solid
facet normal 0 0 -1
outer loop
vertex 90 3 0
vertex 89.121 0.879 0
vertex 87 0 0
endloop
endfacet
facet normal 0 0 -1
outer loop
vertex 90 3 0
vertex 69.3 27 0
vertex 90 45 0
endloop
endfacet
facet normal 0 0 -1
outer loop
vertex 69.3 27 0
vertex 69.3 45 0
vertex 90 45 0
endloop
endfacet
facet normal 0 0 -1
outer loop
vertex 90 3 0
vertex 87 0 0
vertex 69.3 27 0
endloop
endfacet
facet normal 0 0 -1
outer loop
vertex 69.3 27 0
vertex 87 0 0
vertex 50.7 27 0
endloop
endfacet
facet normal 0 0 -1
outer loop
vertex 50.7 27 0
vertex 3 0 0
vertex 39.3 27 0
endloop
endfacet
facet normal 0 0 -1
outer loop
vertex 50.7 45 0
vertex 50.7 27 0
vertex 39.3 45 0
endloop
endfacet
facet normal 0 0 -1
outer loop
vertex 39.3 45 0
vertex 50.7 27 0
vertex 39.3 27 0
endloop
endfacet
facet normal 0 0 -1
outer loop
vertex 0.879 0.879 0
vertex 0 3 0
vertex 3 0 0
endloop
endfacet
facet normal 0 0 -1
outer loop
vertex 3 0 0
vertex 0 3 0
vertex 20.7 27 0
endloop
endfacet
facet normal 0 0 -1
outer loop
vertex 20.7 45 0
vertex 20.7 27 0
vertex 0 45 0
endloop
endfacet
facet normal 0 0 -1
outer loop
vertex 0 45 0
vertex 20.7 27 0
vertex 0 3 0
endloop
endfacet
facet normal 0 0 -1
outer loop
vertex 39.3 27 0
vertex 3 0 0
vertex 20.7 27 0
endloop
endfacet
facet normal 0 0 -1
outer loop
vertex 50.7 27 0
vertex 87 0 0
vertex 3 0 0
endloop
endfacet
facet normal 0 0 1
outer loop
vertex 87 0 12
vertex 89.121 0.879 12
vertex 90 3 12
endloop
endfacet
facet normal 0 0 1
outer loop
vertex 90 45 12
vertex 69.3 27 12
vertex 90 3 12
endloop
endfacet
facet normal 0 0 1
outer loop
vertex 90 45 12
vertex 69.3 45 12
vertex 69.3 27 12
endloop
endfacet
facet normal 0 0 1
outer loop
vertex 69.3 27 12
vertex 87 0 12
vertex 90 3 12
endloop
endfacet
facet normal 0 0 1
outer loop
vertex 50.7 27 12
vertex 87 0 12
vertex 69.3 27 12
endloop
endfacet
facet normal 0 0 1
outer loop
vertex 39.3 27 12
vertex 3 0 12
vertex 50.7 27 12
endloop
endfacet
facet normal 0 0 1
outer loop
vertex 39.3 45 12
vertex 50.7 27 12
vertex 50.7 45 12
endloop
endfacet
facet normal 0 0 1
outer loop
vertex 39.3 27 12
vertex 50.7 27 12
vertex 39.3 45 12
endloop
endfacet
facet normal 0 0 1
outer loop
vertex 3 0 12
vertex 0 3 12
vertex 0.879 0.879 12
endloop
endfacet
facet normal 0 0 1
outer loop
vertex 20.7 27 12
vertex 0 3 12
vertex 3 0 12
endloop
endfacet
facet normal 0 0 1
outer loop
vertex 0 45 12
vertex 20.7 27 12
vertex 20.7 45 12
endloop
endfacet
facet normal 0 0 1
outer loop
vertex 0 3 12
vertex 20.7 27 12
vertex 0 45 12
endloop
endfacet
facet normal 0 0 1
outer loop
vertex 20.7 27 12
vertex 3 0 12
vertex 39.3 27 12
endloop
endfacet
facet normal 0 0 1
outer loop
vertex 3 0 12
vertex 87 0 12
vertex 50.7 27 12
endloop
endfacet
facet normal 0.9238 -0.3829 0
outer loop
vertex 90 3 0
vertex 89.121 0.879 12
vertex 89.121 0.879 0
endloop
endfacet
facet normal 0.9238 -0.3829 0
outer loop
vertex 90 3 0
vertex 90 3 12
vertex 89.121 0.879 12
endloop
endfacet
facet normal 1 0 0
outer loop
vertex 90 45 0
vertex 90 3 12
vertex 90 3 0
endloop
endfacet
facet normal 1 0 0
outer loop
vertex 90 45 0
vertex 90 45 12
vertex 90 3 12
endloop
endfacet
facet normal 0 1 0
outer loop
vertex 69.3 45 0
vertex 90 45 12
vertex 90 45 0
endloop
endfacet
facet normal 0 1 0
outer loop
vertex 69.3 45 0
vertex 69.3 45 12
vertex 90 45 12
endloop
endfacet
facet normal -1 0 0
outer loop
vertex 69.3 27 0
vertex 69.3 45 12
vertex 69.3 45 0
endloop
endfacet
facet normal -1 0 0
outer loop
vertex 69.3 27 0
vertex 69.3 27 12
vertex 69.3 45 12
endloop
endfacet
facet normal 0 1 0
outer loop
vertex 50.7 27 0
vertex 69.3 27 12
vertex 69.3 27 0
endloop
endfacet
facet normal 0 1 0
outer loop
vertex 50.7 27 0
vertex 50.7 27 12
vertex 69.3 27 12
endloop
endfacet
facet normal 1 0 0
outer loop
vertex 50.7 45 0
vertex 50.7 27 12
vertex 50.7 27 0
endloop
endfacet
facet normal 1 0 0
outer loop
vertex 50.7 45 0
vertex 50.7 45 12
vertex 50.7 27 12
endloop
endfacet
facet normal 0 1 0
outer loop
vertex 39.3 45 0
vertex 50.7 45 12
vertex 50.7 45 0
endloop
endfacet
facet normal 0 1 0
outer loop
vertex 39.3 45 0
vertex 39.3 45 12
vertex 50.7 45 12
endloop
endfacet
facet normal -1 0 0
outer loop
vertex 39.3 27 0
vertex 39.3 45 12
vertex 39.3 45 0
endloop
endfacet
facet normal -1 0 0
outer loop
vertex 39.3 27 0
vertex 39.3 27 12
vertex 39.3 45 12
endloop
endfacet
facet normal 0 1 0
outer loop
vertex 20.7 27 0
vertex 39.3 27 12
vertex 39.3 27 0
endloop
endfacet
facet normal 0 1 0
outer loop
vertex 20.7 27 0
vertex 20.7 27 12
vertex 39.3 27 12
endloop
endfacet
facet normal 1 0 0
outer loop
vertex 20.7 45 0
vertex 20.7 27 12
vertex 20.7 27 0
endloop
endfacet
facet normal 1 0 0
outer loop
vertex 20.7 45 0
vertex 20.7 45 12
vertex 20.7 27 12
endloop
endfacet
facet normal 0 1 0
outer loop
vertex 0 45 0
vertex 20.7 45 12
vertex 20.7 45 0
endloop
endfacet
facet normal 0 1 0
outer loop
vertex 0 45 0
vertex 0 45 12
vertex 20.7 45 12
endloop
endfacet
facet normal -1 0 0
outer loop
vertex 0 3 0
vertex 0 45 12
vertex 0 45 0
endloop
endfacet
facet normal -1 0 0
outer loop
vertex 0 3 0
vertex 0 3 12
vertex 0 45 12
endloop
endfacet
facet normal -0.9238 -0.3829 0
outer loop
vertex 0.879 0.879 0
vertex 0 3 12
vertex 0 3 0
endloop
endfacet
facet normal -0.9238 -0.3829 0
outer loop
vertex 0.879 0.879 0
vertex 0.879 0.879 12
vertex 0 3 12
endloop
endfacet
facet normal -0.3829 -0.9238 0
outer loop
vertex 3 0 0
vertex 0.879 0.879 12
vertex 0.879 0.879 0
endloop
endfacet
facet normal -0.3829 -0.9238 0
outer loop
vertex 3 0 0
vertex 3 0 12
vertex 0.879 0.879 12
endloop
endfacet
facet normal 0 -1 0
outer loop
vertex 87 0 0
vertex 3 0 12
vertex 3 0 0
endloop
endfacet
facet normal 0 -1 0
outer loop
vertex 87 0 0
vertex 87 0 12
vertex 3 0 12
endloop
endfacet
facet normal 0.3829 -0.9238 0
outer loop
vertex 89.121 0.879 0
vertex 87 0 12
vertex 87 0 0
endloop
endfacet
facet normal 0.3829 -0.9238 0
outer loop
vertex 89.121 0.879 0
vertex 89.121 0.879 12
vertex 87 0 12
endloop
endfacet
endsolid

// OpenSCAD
$fn = 32;

// ----------------------------------------------------------------------
// Window plate: 90 x 45 mm, 2 open windows
// ----------------------------------------------------------------------

// --- parameters (mm) ---
profile_height = 12;      // extrusion height
profile_points = 16;      // points of the closed outline

profile = [[0, 3], [0.879, 0.879], [3, 0], [87, 0], [89.121, 0.879], [90, 3], [90, 45], [69.3, 45], [69.3, 27], [50.7, 27], [50.7, 45], [39.3, 45], [39.3, 27], [20.7, 27], [20.7, 45], [0, 45]];  // single closed polygon, 16 points, counter clockwise

// --- the one profile operation ---
linear_extrude(height = profile_height) polygon(points = profile);
